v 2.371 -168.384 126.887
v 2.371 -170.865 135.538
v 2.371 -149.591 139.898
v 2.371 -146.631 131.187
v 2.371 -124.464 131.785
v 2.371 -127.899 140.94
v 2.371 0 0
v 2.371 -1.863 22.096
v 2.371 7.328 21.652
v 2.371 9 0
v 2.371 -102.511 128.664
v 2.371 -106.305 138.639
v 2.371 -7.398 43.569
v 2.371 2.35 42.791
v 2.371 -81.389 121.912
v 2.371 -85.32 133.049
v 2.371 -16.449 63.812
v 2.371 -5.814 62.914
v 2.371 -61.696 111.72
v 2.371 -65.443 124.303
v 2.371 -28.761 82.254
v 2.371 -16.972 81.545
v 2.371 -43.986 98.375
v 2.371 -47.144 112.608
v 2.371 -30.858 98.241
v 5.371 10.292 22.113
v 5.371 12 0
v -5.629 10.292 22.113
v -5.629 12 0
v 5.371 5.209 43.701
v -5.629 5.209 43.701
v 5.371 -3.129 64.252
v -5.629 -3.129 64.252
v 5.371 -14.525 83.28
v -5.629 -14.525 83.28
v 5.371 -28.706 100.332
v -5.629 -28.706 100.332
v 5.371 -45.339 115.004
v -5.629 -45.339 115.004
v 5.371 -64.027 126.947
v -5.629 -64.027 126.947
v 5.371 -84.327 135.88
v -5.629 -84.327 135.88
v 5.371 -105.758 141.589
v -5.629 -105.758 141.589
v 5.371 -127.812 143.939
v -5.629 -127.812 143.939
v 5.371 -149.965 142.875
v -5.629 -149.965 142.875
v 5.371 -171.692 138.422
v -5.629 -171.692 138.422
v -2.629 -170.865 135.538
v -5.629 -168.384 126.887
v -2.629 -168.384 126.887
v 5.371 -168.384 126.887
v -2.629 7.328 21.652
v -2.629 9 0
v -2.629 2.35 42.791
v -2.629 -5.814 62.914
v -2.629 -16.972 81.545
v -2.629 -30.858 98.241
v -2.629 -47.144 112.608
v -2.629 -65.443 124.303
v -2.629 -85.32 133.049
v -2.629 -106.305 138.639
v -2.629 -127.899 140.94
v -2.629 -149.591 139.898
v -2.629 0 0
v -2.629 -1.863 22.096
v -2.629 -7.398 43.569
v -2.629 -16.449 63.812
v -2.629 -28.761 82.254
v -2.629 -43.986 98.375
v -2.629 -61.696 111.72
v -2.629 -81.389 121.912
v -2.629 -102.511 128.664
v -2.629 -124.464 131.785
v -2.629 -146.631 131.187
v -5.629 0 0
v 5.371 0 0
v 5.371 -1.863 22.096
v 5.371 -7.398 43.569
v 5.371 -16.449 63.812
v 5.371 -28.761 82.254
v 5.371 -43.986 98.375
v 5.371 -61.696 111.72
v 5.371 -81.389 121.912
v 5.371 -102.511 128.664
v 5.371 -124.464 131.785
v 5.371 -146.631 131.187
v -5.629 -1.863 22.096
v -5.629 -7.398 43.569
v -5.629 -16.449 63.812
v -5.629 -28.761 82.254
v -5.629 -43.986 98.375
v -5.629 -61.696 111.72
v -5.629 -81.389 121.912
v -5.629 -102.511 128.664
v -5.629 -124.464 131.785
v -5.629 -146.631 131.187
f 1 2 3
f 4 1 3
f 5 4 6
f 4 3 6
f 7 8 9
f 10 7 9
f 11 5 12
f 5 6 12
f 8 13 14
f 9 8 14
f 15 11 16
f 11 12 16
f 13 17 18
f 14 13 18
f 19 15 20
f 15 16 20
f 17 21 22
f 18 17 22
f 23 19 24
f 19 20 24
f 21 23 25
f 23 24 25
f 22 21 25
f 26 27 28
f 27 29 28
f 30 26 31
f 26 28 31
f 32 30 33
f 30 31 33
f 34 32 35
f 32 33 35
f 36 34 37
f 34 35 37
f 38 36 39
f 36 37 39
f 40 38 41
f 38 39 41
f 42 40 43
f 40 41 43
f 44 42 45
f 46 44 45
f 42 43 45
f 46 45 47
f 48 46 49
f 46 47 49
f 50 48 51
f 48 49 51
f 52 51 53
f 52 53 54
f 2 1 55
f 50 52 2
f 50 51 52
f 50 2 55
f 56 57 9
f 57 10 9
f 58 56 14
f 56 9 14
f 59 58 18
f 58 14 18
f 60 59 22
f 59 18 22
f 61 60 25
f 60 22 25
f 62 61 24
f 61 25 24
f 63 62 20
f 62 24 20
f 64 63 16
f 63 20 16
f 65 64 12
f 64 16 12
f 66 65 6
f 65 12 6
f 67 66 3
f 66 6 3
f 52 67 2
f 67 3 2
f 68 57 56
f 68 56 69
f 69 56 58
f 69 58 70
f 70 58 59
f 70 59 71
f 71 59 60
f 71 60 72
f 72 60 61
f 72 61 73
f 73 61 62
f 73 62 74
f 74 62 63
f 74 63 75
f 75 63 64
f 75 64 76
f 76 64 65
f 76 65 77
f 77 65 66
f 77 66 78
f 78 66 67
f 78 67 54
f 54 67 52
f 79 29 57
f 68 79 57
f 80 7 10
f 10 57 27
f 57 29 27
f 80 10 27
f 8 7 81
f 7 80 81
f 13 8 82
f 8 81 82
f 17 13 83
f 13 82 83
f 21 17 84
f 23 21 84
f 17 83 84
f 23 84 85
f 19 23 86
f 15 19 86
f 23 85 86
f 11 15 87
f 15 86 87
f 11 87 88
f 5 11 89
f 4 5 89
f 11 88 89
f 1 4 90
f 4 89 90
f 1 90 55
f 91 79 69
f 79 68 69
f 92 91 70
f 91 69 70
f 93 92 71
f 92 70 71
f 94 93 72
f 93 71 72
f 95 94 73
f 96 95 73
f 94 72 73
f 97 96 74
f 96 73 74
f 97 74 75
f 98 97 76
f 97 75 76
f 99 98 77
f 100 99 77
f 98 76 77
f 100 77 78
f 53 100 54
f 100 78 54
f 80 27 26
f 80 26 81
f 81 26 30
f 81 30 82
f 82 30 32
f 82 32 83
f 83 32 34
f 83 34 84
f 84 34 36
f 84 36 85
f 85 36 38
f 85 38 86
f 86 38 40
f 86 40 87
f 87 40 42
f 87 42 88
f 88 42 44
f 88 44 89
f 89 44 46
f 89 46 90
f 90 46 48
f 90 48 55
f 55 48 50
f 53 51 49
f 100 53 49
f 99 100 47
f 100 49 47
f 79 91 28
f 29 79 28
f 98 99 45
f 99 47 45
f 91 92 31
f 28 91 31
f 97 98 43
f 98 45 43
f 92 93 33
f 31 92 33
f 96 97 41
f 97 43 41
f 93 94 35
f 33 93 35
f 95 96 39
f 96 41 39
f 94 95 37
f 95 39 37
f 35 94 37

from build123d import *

# Parameters (mm, degrees)
F2_ANGLE = 106


with BuildPart() as f2:
    # F0 (on Top) → F2 (revolve)
    with BuildSketch(Plane.XY):
        Polygon((5.3707003258, 12), (-5.6292996742, 12), (-5.6292996742, 0), (-2.6292996742, 0), (-2.6292996742, 9), (2.3707003258, 9), (2.3707003258, 0), (5.3707003258, 0), align=None)
    revolve(axis=Axis((0, -132, 0), (1, 0, 0)), revolution_arc=F2_ANGLE)


solid = f2.part
